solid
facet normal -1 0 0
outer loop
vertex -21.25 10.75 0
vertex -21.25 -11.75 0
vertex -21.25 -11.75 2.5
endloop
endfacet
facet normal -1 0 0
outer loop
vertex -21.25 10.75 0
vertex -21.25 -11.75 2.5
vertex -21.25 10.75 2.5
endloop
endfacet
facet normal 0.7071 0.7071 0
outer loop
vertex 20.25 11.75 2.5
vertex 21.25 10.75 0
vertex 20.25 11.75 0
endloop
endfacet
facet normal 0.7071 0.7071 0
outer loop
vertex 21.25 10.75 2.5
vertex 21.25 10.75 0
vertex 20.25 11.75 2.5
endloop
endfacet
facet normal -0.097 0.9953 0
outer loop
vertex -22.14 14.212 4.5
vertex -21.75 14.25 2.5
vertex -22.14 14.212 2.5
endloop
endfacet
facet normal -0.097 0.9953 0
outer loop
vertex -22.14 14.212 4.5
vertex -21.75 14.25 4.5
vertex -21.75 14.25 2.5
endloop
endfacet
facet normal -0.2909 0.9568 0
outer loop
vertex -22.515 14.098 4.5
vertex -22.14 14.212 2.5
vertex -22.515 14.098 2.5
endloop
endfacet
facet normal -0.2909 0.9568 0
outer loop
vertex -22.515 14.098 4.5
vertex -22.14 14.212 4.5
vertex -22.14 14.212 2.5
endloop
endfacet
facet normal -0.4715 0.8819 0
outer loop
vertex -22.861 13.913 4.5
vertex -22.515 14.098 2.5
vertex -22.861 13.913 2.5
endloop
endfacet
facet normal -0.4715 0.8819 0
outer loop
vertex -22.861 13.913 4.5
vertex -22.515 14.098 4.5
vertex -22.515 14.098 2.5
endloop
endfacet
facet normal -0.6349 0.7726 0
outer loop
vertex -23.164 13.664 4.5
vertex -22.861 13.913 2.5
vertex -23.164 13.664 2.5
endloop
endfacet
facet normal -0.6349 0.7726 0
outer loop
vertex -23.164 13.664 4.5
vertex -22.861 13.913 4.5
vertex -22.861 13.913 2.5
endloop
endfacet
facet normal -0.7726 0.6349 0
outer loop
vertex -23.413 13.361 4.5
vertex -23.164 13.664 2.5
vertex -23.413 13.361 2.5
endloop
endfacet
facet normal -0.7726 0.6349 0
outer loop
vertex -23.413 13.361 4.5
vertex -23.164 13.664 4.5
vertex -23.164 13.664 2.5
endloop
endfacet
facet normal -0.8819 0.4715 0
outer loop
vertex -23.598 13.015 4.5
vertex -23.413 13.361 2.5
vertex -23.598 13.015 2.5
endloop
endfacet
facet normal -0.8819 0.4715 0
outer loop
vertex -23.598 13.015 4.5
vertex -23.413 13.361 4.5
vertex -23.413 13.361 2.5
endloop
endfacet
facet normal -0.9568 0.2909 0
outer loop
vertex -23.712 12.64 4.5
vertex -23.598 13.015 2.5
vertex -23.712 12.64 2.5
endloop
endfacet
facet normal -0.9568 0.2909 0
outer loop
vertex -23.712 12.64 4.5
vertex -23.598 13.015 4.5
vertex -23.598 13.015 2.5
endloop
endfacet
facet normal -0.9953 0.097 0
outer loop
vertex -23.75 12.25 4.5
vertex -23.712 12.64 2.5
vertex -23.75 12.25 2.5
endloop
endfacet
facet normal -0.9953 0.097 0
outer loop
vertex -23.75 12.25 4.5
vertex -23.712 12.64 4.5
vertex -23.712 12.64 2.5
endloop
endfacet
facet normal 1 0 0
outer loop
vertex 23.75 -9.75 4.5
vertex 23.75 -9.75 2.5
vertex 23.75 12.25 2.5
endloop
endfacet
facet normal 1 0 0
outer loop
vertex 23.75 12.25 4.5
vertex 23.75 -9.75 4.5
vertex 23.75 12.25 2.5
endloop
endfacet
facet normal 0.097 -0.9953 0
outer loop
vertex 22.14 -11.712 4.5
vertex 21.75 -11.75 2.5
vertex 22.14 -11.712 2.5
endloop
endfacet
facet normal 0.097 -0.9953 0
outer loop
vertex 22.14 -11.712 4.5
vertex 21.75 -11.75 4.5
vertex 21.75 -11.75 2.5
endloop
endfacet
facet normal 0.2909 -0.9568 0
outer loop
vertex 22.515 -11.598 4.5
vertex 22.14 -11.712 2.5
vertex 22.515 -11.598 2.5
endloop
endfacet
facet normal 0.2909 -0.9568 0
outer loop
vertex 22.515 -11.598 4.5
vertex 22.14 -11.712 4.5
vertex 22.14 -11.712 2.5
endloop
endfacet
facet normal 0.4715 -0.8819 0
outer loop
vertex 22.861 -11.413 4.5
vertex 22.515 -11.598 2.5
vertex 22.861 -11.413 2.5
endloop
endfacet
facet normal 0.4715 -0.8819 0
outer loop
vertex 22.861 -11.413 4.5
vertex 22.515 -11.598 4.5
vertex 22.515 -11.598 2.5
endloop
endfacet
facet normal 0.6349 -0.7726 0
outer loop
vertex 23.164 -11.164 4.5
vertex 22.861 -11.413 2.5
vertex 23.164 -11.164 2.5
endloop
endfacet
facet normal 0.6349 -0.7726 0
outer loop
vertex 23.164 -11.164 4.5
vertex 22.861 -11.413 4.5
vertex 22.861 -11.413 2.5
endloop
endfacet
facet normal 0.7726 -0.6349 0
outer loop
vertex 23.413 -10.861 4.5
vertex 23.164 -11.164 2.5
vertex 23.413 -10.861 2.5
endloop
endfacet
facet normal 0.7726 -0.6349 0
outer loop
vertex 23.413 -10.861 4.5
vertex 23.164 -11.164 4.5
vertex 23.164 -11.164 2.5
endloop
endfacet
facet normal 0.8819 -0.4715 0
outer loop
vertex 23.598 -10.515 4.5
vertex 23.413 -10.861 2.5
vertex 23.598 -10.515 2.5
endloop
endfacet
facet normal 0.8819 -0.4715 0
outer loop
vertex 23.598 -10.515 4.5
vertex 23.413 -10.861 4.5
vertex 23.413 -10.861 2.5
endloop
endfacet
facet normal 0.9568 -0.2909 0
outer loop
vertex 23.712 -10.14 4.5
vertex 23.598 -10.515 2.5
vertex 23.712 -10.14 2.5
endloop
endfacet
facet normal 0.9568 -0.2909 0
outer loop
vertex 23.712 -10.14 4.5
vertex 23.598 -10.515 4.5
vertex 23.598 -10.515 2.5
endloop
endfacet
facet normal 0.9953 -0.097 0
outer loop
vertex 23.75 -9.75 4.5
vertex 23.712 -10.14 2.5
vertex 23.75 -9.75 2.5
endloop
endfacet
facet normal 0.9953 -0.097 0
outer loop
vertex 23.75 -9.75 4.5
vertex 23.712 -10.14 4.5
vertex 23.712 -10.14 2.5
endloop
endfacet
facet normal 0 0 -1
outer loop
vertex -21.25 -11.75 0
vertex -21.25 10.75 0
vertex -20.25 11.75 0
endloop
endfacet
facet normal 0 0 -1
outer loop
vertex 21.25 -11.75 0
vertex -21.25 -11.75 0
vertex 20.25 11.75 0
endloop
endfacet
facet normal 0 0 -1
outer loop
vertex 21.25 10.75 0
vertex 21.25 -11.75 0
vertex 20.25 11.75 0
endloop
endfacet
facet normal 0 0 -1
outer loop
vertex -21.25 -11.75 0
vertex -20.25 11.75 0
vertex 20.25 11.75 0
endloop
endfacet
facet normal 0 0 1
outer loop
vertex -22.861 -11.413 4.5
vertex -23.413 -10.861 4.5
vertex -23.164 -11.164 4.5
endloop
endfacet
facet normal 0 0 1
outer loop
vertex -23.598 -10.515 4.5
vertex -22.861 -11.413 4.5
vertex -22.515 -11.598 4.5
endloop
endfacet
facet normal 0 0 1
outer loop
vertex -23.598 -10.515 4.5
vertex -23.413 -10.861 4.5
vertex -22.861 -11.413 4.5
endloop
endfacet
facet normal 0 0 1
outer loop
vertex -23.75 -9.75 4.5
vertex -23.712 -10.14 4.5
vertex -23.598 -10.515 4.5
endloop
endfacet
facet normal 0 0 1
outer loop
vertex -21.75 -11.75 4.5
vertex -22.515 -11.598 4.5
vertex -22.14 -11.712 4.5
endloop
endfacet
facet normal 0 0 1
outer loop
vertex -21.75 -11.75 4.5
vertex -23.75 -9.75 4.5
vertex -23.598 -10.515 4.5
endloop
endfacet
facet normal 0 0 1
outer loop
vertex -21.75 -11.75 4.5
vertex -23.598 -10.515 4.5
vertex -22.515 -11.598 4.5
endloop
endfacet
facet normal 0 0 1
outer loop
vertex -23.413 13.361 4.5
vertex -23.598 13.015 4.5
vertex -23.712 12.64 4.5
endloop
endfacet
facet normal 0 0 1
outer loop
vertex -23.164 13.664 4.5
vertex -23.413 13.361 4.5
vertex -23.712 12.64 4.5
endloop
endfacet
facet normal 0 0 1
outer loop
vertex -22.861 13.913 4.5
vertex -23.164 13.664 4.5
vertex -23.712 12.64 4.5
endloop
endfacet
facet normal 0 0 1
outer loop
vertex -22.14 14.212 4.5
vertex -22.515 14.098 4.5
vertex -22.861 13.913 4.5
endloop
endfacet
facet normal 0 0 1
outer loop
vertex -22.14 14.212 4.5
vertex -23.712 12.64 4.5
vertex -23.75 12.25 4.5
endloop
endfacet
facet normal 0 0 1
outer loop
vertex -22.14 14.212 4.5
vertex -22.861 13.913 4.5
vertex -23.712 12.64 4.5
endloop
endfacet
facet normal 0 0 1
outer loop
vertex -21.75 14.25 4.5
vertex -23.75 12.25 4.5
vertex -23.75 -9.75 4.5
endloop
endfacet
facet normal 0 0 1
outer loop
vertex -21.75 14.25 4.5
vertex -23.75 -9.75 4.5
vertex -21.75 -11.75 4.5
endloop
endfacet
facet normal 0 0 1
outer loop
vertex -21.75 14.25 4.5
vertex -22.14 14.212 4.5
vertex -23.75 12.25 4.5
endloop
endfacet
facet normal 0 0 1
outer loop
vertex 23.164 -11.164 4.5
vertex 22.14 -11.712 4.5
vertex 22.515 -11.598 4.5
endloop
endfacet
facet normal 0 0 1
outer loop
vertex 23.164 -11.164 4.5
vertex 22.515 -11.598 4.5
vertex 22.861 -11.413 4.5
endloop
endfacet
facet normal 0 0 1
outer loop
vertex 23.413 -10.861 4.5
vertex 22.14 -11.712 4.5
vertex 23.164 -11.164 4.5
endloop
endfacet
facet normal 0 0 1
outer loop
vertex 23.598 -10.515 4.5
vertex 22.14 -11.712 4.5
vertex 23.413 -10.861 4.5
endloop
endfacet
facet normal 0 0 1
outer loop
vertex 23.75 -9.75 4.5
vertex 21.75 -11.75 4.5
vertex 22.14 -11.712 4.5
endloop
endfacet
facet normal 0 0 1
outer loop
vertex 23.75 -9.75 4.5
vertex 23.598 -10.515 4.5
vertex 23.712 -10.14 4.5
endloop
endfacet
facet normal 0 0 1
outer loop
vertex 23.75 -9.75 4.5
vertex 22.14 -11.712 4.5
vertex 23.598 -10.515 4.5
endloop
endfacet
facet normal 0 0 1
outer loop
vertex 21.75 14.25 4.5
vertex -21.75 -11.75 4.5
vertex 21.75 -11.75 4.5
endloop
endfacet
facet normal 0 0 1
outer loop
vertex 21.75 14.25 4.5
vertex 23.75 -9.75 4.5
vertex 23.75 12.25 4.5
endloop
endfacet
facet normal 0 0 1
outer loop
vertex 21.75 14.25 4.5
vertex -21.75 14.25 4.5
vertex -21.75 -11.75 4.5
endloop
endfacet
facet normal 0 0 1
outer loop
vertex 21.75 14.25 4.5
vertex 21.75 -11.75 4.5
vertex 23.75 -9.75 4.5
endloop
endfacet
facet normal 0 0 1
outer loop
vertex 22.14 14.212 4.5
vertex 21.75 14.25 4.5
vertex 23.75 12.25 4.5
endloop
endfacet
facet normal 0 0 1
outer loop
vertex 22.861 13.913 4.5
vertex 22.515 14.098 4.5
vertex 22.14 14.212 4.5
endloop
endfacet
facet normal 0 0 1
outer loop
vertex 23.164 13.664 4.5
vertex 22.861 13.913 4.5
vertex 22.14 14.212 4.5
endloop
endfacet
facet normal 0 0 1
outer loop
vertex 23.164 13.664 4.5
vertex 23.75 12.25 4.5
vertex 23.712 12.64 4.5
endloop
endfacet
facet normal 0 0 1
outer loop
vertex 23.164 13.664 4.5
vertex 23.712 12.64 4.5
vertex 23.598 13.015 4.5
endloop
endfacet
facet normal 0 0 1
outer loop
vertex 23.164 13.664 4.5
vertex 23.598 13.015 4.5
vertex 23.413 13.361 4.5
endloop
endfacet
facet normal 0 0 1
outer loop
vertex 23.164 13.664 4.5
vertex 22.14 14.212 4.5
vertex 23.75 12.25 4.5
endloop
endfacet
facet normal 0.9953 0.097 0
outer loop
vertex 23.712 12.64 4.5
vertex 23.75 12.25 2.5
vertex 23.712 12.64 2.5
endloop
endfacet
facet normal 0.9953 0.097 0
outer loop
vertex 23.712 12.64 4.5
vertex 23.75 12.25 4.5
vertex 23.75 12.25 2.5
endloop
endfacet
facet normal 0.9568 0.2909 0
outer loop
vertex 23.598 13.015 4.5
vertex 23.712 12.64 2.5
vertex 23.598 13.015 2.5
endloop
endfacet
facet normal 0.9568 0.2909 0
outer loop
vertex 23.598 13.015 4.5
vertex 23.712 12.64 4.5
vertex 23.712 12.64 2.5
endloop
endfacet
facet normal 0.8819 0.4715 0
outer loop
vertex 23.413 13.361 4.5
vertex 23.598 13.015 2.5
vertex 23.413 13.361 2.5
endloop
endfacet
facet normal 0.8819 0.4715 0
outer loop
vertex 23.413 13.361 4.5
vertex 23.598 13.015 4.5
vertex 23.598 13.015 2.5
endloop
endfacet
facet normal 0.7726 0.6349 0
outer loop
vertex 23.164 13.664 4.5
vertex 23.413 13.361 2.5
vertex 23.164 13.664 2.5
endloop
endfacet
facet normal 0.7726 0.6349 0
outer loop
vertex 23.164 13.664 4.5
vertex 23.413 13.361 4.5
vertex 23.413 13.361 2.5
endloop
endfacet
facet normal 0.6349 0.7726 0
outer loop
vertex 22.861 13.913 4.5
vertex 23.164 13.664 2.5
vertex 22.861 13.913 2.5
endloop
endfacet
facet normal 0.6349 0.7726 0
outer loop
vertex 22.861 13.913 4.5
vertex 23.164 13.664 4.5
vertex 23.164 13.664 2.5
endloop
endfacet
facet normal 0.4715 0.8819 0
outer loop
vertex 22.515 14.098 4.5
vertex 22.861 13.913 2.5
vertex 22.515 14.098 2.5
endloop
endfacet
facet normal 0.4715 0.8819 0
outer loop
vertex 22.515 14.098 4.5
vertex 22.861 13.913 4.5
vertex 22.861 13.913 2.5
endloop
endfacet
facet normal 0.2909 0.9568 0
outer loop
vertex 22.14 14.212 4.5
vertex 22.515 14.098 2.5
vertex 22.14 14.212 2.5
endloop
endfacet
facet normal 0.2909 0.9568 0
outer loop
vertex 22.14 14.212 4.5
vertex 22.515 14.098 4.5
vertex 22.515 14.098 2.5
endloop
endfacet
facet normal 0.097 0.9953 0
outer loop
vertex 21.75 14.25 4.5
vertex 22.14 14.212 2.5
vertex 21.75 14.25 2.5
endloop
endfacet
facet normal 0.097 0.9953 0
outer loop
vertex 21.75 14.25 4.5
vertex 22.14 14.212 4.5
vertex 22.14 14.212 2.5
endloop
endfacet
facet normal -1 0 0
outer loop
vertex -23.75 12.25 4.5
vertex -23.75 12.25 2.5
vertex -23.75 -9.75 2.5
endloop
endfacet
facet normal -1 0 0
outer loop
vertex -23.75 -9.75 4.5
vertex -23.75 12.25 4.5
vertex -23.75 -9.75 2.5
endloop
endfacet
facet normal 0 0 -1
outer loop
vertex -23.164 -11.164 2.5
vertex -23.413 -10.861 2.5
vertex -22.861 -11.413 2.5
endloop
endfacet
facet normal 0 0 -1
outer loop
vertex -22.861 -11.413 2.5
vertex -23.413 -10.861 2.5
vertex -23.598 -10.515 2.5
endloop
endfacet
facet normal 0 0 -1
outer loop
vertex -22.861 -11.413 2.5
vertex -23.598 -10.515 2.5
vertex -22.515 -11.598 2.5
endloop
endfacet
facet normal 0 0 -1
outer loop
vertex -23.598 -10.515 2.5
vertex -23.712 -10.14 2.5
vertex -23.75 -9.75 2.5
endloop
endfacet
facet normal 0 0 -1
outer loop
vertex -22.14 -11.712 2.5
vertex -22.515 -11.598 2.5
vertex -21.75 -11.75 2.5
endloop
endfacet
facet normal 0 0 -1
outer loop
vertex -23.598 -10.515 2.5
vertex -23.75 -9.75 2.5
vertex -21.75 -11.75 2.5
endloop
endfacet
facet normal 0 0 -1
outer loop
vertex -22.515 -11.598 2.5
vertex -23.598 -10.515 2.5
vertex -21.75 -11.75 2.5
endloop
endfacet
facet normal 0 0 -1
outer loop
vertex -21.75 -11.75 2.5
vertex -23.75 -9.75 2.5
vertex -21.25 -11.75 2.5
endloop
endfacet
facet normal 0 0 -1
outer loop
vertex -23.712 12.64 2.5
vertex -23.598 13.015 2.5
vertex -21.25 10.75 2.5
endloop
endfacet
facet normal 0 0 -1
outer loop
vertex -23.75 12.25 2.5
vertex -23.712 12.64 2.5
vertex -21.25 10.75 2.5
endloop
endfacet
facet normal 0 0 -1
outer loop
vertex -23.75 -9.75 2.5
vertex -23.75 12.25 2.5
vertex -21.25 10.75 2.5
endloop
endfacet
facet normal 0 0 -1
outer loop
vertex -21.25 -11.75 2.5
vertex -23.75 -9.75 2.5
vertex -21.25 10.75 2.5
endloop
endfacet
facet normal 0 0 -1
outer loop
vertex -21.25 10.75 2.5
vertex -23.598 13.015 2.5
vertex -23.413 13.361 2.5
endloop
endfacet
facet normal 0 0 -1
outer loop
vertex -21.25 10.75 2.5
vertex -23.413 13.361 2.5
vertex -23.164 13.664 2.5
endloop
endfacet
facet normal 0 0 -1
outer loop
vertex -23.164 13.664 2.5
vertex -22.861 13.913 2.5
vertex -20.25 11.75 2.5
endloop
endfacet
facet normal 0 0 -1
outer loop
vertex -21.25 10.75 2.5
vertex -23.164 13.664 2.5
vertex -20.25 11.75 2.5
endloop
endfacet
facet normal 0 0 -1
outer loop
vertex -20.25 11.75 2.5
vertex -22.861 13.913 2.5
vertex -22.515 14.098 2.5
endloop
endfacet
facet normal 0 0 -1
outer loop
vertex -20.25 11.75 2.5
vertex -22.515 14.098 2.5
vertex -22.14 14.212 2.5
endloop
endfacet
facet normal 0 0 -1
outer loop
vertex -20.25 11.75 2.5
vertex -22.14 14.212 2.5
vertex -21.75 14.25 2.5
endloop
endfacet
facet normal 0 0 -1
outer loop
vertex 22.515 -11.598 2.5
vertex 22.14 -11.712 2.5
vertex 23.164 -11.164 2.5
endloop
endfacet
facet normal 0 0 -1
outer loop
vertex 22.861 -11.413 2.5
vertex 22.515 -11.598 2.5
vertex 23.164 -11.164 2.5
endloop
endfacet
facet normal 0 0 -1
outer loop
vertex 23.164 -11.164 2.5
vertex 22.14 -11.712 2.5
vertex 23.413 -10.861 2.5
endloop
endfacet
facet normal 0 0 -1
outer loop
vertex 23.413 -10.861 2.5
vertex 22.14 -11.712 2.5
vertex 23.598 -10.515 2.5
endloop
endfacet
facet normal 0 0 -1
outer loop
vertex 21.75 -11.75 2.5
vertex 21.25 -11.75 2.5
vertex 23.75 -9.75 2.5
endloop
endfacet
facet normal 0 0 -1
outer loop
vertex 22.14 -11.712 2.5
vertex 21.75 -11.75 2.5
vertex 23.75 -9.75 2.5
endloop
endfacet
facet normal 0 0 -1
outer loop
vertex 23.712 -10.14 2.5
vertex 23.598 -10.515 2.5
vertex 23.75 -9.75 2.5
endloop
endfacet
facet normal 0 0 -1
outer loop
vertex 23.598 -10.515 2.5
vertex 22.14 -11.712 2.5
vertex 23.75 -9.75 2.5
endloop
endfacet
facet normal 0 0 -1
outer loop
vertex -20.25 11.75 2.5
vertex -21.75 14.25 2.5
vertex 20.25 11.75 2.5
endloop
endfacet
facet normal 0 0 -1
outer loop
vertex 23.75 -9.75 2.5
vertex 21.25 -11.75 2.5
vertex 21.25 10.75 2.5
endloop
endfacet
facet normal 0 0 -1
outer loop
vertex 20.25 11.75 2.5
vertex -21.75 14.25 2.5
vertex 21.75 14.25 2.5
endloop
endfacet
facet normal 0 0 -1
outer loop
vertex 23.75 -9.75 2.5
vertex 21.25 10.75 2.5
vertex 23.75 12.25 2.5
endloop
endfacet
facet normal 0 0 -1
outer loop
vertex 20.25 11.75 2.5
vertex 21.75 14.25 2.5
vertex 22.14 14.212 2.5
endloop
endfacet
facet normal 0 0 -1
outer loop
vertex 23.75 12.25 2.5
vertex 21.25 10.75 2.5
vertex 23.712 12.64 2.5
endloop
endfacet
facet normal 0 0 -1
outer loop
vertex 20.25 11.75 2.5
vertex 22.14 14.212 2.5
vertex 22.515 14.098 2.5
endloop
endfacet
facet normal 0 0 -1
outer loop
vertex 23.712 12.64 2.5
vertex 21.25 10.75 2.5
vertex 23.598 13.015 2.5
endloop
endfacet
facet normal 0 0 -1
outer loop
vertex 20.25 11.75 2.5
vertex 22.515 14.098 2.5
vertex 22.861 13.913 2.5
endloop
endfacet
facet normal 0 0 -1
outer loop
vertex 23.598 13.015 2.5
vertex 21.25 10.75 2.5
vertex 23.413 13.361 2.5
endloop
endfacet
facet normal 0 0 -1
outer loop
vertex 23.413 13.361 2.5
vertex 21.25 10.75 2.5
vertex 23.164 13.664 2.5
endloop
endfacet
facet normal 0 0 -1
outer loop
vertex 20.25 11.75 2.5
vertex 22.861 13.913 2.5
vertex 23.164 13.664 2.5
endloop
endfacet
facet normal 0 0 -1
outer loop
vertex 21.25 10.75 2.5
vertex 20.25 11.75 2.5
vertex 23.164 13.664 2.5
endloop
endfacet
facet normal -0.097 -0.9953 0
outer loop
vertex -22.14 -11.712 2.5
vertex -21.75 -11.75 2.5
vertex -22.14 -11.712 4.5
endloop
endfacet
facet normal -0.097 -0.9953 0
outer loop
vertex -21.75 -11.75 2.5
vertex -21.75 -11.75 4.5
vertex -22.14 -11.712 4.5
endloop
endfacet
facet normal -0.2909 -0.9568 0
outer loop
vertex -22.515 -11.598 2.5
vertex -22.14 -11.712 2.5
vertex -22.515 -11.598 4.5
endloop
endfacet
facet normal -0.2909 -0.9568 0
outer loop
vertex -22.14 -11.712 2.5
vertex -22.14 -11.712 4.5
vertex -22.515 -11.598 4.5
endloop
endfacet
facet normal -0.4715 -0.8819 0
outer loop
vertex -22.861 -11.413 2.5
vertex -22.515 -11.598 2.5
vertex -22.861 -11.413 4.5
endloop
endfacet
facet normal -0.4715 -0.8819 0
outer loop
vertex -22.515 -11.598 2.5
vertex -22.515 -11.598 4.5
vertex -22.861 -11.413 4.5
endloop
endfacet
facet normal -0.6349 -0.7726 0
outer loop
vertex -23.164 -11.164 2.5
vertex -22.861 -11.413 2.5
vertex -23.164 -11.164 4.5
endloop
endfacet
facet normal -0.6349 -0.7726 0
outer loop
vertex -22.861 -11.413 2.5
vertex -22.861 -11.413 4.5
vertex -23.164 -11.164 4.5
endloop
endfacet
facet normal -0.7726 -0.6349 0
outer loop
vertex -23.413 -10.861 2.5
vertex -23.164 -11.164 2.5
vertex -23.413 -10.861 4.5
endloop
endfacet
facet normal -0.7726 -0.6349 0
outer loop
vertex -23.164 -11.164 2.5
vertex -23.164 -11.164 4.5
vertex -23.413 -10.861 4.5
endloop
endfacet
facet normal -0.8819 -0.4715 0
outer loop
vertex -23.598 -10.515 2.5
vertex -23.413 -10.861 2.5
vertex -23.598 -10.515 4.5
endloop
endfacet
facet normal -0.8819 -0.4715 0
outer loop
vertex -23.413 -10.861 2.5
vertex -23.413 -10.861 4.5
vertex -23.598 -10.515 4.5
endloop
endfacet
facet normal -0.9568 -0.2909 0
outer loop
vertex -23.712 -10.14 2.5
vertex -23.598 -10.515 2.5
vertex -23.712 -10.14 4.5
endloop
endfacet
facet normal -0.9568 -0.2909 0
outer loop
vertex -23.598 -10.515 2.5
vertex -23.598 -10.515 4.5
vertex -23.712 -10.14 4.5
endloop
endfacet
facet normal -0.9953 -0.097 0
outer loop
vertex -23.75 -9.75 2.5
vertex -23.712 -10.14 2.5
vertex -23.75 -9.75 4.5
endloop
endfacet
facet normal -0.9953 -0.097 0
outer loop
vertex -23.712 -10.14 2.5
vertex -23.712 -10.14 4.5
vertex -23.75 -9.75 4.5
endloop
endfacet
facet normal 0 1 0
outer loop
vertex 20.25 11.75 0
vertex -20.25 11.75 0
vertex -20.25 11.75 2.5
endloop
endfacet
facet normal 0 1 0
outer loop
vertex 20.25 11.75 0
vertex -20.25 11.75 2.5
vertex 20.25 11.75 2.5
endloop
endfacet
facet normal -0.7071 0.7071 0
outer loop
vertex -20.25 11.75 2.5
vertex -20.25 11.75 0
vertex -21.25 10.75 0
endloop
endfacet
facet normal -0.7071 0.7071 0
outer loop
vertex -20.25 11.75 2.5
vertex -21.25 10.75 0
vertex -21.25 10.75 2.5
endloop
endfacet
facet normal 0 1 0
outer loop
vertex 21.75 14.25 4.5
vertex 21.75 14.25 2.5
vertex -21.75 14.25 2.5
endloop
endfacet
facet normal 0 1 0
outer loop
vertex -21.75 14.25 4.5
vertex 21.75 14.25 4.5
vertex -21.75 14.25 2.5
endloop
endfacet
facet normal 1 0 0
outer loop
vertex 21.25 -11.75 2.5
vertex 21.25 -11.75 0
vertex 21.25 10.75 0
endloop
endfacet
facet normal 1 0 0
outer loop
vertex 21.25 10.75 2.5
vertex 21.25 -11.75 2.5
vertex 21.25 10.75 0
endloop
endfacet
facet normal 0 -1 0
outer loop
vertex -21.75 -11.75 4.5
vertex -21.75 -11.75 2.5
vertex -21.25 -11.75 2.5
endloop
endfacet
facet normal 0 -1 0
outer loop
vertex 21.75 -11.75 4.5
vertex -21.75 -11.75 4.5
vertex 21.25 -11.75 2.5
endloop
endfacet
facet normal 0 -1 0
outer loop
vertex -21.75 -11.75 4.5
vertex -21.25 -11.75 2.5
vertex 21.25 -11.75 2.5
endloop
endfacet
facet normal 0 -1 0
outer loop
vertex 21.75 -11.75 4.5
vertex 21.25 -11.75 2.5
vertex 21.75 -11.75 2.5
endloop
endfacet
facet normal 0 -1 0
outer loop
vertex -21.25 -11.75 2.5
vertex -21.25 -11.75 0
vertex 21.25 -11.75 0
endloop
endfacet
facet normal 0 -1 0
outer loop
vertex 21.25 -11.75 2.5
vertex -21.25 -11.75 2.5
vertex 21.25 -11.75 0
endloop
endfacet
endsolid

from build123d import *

# Parameters (mm, degrees)
F0_W     = 42.5
F0_H     = 23.5
F1_DEPTH = 2.5
F2_W     = 42.5
F2_H     = 23.5
F3_DEPTH = 2
F4_SIZE  = 1
F5_R     = 2


with BuildPart() as f1:
    # F0 (on Top) → F1 (new body)
    with BuildSketch(Plane.XY):
        Rectangle(F0_W, F0_H)
    extrude(amount=F1_DEPTH)

    # F2 (on face) + F0 (on Top) → F3 (join)
    with BuildSketch(Plane.XY.offset(2.5)):
        Polygon((-23.75, 14.25), (-23.75, -11.75), (-21.25, -11.75), (-21.25, 11.75), (21.25, 11.75), (21.25, -11.75), (23.75, -11.75), (23.75, 14.25), align=None)
        Rectangle(F2_W, F2_H)
    with BuildSketch(Plane.XY):
        Rectangle(F0_W, F0_H)
    extrude(amount=F3_DEPTH)

    # F4
    f4_edges = [f1.edges().sort_by_distance(p)[0] for p in [
        (21.25, 11.75, 1.25),
        (-21.25, 11.75, 1.25),
    ]]
    chamfer(f4_edges, length=F4_SIZE)

    # F5
    f5_edges = [f1.edges().sort_by_distance(p)[0] for p in [
        (23.75, 14.25, 3.5),
        (23.75, -11.75, 3.5),
        (-23.75, 14.25, 3.5),
        (-23.75, -11.75, 3.5),
    ]]
    fillet(f5_edges, radius=F5_R)


solid = f1.part
